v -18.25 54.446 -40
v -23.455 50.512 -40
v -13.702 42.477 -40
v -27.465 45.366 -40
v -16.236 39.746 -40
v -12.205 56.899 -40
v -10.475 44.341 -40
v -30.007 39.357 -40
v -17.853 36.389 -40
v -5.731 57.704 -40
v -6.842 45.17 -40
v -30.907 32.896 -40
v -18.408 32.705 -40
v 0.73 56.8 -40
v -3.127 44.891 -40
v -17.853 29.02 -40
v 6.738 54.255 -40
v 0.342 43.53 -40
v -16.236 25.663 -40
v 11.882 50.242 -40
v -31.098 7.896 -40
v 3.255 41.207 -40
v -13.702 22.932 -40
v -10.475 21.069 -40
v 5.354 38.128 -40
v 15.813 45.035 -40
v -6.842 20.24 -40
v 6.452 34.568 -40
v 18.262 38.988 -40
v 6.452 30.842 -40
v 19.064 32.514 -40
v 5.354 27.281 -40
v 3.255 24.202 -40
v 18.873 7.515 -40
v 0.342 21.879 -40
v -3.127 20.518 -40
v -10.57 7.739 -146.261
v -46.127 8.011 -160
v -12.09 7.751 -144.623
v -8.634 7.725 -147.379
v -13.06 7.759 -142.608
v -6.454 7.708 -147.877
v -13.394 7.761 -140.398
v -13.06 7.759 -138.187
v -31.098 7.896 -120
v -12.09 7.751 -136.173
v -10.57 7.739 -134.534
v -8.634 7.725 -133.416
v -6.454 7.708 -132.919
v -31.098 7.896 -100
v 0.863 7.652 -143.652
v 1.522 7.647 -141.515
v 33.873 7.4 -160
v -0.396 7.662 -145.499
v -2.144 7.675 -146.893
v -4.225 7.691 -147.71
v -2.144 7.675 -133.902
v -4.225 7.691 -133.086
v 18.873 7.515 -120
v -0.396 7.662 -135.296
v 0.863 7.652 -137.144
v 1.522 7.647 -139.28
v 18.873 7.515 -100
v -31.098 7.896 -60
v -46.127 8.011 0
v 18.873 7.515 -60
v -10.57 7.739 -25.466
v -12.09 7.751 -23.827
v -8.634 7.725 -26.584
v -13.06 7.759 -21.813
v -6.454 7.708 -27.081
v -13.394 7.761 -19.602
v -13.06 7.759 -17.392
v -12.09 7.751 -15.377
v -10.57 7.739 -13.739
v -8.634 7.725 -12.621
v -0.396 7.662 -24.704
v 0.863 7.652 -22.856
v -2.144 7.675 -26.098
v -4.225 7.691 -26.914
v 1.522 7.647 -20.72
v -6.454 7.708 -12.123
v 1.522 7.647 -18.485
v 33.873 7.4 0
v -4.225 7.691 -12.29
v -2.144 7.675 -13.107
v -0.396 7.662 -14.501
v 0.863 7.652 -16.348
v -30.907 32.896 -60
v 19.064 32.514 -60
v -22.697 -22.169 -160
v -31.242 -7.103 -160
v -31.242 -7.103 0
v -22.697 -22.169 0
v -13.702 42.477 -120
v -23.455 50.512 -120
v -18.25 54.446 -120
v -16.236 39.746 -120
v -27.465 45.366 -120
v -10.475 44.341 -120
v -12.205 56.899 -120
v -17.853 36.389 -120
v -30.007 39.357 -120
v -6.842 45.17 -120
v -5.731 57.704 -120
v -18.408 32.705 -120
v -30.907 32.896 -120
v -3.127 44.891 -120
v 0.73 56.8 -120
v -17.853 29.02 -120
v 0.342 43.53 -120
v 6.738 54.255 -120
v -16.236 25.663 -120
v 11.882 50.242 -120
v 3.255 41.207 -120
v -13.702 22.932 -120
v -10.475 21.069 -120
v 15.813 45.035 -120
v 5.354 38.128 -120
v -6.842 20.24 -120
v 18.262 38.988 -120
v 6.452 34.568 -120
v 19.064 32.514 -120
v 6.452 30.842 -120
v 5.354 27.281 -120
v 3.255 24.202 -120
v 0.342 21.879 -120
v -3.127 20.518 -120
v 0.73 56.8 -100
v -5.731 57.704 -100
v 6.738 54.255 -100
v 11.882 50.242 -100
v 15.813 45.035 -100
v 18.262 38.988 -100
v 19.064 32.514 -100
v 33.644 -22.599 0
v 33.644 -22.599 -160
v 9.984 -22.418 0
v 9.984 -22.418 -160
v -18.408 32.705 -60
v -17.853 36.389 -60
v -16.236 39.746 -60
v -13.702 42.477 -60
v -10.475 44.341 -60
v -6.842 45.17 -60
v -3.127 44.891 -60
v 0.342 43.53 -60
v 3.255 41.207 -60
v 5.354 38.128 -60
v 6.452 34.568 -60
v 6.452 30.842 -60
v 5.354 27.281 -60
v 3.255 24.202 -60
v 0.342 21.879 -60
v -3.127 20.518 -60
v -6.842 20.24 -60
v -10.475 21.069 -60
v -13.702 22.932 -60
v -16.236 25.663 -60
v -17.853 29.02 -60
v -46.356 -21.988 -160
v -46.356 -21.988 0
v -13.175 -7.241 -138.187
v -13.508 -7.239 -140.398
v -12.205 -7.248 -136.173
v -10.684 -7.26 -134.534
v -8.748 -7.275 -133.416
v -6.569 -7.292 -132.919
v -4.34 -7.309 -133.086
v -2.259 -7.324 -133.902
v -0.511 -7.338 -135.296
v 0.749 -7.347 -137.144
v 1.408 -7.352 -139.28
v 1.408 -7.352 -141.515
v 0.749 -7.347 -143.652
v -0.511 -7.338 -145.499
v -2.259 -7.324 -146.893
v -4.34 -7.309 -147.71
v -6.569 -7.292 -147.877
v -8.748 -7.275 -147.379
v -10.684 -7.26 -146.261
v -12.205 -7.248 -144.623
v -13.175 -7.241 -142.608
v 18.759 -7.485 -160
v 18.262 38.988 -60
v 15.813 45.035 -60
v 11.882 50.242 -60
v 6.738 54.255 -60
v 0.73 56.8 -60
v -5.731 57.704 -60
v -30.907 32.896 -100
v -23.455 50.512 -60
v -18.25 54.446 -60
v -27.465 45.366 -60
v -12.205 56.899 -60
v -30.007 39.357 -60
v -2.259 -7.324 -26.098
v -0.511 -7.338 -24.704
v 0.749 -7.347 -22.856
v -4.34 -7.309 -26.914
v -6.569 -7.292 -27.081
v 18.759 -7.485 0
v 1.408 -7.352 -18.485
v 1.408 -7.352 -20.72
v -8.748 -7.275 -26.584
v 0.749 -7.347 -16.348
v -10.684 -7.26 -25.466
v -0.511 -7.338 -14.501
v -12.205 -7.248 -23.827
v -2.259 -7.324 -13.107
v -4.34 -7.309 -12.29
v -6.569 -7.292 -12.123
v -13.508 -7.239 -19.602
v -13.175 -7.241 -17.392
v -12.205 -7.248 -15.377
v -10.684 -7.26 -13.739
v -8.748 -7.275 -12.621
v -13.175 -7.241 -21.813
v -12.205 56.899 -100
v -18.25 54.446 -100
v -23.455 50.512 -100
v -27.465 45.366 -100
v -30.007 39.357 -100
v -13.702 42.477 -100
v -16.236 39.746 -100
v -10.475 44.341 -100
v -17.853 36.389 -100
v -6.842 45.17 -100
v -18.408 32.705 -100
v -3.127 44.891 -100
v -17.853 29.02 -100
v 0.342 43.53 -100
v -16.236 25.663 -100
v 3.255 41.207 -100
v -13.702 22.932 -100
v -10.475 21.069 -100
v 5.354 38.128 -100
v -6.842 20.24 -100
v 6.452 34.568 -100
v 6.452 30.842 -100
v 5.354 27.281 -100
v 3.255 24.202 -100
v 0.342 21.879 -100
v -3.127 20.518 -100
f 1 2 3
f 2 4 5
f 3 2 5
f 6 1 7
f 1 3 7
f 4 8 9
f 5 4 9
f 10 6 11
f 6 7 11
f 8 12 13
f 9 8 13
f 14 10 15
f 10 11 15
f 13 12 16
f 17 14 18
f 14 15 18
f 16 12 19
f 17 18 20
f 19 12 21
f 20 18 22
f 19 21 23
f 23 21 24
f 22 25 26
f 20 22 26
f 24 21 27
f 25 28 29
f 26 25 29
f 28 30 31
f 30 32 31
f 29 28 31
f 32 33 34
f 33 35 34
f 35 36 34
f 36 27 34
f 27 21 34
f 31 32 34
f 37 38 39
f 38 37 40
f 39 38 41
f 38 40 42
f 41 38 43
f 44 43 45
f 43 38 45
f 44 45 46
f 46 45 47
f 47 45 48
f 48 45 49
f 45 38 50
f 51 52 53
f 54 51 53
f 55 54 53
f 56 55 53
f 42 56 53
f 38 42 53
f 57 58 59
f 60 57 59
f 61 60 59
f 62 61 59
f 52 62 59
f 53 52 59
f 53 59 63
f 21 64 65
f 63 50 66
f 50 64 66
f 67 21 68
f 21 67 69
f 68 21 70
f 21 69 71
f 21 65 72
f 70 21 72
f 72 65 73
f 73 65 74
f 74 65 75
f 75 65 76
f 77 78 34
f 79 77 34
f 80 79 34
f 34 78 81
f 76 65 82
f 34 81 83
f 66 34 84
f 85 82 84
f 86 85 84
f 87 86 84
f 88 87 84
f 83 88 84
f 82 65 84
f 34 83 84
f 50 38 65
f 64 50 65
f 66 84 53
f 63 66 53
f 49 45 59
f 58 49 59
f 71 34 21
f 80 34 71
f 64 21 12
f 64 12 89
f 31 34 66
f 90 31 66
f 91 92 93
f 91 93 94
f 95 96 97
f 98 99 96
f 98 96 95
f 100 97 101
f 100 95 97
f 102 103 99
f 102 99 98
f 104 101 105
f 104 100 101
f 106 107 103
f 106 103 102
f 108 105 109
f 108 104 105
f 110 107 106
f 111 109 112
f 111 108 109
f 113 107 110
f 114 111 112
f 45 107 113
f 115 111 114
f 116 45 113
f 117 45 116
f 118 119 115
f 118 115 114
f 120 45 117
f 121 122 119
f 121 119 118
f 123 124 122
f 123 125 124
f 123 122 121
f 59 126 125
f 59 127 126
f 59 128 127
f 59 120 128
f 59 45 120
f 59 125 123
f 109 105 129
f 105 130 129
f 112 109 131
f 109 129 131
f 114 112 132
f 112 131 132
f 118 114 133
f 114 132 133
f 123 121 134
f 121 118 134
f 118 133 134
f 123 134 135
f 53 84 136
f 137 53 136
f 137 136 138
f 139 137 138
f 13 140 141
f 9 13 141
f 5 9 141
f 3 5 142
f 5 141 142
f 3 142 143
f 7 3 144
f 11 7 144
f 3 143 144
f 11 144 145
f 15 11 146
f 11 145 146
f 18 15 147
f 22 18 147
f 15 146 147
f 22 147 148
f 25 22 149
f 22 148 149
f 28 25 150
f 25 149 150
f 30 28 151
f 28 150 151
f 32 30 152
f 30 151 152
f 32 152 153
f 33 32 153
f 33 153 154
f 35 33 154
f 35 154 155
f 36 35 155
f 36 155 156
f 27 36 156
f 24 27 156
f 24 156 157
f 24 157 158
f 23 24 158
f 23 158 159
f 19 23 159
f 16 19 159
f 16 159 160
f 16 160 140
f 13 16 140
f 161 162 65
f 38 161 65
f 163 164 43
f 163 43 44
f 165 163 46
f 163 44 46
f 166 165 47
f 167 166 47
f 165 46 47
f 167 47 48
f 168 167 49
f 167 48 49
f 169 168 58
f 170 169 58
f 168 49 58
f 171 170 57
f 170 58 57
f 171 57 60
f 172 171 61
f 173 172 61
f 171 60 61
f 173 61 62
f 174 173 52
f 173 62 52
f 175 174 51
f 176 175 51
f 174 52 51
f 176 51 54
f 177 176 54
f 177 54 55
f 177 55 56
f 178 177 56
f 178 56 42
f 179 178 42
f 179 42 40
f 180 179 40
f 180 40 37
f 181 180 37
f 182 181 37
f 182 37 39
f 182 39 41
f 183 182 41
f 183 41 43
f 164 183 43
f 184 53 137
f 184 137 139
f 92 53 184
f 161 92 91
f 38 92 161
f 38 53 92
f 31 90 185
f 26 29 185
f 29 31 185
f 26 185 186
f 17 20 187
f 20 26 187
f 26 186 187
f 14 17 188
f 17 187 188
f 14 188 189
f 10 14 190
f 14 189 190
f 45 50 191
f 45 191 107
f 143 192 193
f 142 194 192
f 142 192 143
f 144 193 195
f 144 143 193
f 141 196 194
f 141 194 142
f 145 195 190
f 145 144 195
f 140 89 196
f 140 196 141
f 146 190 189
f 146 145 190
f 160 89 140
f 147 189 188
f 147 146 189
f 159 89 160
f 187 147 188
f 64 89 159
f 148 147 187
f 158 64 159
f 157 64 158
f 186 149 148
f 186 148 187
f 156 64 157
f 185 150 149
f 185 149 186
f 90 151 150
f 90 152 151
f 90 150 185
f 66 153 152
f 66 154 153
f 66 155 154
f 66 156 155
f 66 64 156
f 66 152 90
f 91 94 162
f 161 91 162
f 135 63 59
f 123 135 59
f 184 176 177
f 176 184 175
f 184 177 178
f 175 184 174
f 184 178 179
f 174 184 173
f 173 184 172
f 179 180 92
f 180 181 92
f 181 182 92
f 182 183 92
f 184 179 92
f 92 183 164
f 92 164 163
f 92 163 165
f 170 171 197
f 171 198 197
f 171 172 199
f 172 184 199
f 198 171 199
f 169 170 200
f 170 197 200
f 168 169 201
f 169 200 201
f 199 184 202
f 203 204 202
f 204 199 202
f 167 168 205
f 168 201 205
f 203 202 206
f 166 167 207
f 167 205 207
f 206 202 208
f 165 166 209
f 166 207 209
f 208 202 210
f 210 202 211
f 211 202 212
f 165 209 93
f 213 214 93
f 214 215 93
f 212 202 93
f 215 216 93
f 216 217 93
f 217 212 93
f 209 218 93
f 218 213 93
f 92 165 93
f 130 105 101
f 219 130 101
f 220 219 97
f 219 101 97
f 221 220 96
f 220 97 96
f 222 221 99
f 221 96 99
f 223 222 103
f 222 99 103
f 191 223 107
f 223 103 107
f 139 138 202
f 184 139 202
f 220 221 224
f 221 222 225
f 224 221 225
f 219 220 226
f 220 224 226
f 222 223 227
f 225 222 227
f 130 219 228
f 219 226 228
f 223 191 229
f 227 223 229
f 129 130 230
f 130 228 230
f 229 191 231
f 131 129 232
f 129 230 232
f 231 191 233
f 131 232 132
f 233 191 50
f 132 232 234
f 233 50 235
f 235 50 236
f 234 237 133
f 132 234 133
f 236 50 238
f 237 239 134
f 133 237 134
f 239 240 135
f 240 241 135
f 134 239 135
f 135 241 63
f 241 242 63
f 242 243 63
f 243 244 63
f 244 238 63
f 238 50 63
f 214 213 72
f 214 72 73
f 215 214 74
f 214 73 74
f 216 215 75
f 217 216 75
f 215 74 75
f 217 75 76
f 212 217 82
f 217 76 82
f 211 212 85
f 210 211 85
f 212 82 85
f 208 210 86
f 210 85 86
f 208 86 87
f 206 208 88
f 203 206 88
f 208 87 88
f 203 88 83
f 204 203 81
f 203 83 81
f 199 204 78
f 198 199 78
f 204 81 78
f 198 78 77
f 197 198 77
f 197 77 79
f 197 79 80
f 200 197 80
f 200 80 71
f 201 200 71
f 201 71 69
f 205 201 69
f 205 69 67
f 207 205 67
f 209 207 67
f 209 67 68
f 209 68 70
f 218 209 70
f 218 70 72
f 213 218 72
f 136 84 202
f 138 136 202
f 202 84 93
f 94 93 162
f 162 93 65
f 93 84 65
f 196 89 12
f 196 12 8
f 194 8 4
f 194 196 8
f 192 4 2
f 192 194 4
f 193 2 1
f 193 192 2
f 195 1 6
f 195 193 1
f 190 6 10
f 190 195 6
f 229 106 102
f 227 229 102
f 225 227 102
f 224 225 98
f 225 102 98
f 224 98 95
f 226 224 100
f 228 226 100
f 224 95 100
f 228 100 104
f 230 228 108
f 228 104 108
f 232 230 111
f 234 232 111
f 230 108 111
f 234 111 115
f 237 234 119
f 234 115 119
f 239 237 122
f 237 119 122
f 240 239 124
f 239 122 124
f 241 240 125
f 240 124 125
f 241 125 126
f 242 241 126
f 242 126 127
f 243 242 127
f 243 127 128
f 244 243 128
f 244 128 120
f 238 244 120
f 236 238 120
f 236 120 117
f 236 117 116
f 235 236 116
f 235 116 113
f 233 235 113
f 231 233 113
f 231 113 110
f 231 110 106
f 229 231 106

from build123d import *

# Parameters (mm, degrees)
BOSS_EXTRUDE2_DEPTH = 160
SKETCH10_R          = 7.5
CUT_EXTRUDE3_DEPTH  = 37
SKETCH15_W          = 49.972994953
SKETCH15_H          = 20
BOSS_EXTRUDE3_DEPTH = 50
FILLET8_R           = 25
FILLET9_R           = 25
FILLET10_R          = 25
FILLET11_R          = 25
SKETCH20_R          = 12.5
CUT_EXTRUDE16_DEPTH = 120


with BuildPart() as part:
    # Sketch9 → Boss-Extrude2 (new body)
    with BuildSketch(Plane.XY):
        Polygon((-46.127266272, 8.011064826), (33.872733728, 7.400024977), (33.643600468, -22.599099976), (9.984036558, -22.418388271), (18.758604622, -7.484970869), (-31.242270425, -7.10306428), (-22.696835622, -22.168771831), (-46.356399532, -21.988060127), align=None)
    extrude(amount=-BOSS_EXTRUDE2_DEPTH)

    # Sketch10 → Cut-Extrude3 (cut)
    with BuildSketch(Plane(origin=(0.058494066, 7.658298076, 0), x_dir=(0.9999708317686696, -0.007637775322375965, 0), z_dir=(0.007637775322375965, 0.9999708317686696, 0))):
        with Locations(Location((-5.952514862, 19.602368066, 0), (0, 0, 180))):
            Circle(SKETCH10_R)
        with Locations(Location((-5.952514862, 140.397631934, 0), (0, 0, 180))):
            Circle(SKETCH10_R)
    extrude(amount=-CUT_EXTRUDE3_DEPTH, mode=Mode.SUBTRACT)

    # Sketch15 → Boss-Extrude3 (add)
    with BuildSketch(Plane(origin=(0.058494066, 7.658298076, 0), x_dir=(0.9999708317686696, -0.007637775322375965, 0), z_dir=(0.007637775322375965, 0.9999708317686696, 0))):
        with Locations((-6.171271485, 50)):
            Rectangle(SKETCH15_W, SKETCH15_H)
        with Locations((-6.171271485, 110)):
            Rectangle(SKETCH15_W, SKETCH15_H)
    extrude(amount=BOSS_EXTRUDE3_DEPTH)

    # Fillet8
    fillet8_edges = [part.edges().sort_by_distance(p)[0] for p in [
        (-30.716477311, 57.894815703, -50),
    ]]
    fillet(fillet8_edges, radius=FILLET8_R)

    # Fillet9
    # the kernel refuses this fillet: 25 mm, written as the material it takes off along each edge
    with BuildSketch(Plane(origin=(19.255060017, 57.513133196, -122.5), x_dir=(-0.9999708317686696, 0.007637775322376116, 0), z_dir=(0, 0, 1))) as fillet9_piece_1_section:
        with BuildLine():
            CenterArc((FILLET9_R, FILLET9_R), FILLET9_R, 180, 90)
            Line((0, FILLET9_R), (0, 0))
            Line((0, 0), (FILLET9_R, 0))
        make_face()
    fillet9_piece_1 = extrude(amount=145, mode=Mode.PRIVATE)
    fillet9_piece_1 = split(fillet9_piece_1, bisect_by=Plane(origin=(11.883432775, 50.243784792, -100), z_dir=(0, 0, 1)), keep=Keep.TOP, mode=Mode.PRIVATE)
    add(fillet9_piece_1, mode=Mode.SUBTRACT)

    # Fillet10
    fillet10_edges = [part.edges().sort_by_distance(p)[0] for p in [
        (-30.716477311, 57.894815703, -110),
    ]]
    fillet(fillet10_edges, radius=FILLET10_R)

    # Fillet11
    # the kernel refuses this fillet: 25 mm, written as the material it takes off along each edge
    with BuildSketch(Plane(origin=(19.255060017, 57.513133196, -37.5), x_dir=(-0.9999708317686696, 0.007637775322376116, 0), z_dir=(0, 0, -1))) as fillet11_piece_1:
        with BuildLine():
            CenterArc((FILLET11_R, -FILLET11_R), FILLET11_R, 90, 90)
            Line((0, -FILLET11_R), (0, 0))
            Line((0, 0), (FILLET11_R, 0))
        make_face()
    extrude(amount=145, mode=Mode.SUBTRACT)

    # Sketch20 → Cut-Extrude16 (cut)
    with BuildSketch(Plane(origin=(0, 0, -120), x_dir=(-1, 0, 0), z_dir=(0, 0, -1))):
        with Locations((5.9081509, 32.704600526)):
            Circle(SKETCH20_R)
    extrude(amount=-CUT_EXTRUDE16_DEPTH, mode=Mode.SUBTRACT)


solid = part.part
